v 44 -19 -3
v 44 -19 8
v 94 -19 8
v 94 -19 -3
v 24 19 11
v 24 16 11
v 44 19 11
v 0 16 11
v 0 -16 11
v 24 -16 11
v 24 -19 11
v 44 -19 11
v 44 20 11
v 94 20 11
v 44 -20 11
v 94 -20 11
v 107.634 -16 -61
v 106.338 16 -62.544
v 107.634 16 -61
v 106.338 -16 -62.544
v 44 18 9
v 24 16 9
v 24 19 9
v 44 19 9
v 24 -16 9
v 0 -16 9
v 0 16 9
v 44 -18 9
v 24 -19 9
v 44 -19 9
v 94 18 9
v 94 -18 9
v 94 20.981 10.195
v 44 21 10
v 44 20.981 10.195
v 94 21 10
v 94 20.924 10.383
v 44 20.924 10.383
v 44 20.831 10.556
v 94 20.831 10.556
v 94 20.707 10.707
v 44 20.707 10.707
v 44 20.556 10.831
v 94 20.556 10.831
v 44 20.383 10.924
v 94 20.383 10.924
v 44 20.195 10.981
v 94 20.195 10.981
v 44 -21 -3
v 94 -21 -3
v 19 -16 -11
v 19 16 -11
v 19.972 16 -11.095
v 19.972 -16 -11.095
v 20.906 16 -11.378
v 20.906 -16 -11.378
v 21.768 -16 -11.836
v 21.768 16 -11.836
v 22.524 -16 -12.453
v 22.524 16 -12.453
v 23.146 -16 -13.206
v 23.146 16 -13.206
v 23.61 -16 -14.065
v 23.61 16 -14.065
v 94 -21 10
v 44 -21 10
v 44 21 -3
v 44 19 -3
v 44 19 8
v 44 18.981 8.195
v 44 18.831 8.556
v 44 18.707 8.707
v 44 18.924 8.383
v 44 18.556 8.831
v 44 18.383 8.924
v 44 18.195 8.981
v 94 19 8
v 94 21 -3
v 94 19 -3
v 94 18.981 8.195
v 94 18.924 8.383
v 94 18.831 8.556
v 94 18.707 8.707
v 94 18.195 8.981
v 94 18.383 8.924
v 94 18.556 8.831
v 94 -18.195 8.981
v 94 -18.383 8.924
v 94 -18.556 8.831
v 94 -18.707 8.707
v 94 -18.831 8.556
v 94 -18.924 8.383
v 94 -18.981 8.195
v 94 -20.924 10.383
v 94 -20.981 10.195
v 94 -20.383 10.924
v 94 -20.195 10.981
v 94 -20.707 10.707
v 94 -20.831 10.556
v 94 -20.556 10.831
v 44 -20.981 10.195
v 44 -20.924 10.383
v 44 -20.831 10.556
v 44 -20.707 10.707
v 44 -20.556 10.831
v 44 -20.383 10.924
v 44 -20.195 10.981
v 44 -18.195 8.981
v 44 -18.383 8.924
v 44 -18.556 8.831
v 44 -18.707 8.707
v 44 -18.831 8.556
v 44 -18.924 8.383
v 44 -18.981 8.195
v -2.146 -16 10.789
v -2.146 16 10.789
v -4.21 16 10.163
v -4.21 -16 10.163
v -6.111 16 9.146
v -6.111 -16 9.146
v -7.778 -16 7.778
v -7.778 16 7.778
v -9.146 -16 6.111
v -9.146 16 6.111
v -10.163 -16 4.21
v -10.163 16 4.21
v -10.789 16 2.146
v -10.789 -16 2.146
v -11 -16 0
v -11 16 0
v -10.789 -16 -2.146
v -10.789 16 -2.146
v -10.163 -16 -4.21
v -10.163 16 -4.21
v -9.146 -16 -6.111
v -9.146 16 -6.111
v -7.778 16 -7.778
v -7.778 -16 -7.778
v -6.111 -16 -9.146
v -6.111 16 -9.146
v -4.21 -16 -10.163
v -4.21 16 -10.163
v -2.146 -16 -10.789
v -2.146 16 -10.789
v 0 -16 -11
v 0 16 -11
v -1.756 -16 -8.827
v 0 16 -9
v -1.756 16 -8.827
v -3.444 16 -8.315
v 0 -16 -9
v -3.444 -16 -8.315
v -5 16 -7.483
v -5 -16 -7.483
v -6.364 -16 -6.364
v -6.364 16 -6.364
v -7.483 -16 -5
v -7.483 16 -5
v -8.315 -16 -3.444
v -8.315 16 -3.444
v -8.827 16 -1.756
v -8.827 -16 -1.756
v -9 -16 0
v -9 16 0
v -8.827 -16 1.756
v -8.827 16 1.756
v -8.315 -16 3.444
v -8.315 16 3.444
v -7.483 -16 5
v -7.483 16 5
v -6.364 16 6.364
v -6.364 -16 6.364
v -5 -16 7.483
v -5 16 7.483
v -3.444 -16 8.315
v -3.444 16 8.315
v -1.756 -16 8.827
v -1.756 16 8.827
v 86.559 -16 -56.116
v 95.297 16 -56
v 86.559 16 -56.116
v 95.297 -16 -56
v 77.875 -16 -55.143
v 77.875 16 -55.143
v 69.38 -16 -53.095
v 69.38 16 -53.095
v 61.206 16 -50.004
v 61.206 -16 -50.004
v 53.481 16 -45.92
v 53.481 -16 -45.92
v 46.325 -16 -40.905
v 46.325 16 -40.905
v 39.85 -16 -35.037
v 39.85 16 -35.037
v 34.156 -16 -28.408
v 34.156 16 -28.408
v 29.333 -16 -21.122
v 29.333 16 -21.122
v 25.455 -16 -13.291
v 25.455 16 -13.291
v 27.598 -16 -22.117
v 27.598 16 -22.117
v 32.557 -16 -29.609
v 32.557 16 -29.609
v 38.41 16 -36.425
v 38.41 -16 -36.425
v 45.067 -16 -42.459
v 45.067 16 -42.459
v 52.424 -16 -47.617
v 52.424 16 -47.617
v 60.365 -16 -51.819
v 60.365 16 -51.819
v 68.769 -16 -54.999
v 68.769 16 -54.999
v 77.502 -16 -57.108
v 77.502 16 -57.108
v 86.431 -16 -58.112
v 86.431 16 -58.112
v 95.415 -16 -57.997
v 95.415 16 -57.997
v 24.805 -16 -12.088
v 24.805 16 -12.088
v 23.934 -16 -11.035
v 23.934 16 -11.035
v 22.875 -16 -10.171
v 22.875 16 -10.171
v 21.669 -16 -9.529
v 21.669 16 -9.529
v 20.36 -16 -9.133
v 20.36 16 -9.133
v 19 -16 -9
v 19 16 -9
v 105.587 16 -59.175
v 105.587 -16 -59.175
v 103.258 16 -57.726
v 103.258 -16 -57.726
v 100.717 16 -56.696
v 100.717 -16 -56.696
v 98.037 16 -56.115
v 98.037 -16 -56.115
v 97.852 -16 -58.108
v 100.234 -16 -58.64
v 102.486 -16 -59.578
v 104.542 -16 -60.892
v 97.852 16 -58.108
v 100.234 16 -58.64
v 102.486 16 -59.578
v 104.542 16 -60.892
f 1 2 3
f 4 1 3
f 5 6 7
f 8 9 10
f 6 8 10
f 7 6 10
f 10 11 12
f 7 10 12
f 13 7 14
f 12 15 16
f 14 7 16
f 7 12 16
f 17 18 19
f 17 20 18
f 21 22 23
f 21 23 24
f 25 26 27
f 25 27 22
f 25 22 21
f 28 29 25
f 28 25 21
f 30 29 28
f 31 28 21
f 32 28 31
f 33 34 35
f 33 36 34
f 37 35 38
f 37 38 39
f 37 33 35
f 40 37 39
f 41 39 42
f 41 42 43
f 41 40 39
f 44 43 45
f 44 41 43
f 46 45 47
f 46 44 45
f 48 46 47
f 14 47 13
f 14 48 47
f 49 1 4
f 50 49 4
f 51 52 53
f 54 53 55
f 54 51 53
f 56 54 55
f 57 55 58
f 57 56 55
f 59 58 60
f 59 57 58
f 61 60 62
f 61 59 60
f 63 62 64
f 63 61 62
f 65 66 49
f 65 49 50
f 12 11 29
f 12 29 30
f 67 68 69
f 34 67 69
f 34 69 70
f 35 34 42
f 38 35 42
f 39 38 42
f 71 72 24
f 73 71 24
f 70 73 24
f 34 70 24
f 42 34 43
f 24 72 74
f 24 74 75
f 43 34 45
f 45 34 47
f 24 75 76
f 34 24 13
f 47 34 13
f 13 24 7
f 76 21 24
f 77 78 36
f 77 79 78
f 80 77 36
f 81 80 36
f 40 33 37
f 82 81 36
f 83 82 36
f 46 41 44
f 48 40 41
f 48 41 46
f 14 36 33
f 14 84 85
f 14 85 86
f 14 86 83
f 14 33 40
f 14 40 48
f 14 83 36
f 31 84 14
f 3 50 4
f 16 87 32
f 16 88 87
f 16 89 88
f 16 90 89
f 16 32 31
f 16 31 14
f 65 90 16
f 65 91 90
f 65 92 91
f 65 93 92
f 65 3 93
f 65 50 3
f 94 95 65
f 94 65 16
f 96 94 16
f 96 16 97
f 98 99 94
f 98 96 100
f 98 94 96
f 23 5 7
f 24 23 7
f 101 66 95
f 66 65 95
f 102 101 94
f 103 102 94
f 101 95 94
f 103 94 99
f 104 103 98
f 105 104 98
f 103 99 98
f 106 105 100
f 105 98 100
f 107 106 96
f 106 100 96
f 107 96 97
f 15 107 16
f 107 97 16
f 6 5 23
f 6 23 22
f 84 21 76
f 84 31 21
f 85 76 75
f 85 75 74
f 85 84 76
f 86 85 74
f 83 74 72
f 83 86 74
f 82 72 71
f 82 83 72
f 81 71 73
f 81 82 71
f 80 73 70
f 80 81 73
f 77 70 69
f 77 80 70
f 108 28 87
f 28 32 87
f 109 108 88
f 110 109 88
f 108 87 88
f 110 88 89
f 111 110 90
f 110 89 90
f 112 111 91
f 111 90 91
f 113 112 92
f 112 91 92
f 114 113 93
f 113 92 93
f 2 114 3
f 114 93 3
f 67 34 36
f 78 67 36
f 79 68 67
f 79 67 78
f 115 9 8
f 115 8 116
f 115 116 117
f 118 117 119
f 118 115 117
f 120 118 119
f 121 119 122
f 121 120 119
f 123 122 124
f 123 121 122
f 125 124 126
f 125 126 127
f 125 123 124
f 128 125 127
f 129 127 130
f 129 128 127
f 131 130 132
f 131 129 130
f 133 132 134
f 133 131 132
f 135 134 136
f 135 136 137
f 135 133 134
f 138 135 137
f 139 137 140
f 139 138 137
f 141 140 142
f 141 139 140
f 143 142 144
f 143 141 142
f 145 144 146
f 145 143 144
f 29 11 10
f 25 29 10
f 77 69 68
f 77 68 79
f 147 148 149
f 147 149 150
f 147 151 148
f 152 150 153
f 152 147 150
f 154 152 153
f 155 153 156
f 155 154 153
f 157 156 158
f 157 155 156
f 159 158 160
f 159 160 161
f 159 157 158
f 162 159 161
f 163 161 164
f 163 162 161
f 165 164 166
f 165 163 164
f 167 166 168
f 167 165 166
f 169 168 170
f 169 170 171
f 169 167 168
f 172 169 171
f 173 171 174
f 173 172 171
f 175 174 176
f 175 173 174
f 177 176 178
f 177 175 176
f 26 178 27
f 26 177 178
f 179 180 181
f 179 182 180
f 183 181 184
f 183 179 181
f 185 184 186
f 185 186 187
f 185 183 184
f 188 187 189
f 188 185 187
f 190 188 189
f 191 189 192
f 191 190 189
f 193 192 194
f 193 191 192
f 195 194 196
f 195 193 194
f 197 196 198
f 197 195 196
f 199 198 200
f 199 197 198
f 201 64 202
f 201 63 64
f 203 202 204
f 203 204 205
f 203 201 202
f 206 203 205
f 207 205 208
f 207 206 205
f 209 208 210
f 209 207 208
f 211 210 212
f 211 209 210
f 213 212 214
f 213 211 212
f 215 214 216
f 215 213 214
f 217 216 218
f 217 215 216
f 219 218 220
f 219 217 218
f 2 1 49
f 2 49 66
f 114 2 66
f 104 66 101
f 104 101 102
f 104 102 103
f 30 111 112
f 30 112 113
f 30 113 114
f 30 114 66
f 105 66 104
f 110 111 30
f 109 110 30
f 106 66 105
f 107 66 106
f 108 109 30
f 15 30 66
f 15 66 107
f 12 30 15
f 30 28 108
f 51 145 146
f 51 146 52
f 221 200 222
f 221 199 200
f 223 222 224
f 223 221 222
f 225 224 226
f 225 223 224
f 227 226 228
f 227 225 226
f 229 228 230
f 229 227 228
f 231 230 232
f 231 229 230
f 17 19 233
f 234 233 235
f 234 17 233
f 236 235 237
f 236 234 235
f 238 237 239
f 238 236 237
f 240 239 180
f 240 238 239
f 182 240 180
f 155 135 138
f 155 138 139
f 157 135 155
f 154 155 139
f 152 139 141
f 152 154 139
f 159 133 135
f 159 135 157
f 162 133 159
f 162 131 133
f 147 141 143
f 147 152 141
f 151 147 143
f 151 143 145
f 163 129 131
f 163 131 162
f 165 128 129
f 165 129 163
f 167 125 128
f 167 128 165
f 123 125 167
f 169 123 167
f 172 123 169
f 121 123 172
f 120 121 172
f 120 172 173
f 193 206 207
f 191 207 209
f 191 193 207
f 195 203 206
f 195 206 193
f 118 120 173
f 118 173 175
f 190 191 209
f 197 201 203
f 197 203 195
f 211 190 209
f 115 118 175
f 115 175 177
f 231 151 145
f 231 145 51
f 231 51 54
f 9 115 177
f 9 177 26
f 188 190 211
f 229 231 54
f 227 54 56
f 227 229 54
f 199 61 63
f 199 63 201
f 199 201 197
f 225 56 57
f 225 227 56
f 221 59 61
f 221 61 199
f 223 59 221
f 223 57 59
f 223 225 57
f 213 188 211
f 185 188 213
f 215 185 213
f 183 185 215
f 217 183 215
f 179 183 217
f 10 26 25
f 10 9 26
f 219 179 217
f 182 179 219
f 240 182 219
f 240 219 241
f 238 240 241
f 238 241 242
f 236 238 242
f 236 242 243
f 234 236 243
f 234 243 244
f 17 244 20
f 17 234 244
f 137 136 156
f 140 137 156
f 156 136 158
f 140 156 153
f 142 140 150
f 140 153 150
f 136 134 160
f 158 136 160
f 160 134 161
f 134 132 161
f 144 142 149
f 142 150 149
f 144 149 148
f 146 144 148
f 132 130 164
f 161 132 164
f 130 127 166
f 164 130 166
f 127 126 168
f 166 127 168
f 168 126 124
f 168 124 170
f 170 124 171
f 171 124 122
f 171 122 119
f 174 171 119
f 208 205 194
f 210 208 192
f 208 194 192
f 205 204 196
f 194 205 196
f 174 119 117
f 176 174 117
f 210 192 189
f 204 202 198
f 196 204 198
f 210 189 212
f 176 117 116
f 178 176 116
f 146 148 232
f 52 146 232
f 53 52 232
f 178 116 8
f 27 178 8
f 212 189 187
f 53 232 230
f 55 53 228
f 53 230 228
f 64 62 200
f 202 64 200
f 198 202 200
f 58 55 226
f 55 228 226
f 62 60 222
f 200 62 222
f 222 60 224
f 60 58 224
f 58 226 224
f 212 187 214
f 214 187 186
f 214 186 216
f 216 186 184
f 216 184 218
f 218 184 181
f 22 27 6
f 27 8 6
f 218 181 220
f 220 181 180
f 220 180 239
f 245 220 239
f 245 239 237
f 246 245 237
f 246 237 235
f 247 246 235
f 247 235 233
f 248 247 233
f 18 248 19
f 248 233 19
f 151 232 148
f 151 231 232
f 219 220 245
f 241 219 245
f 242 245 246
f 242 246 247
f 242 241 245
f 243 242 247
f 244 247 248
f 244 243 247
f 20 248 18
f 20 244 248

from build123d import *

# Parameters (mm, degrees)
F1_DEPTH = 16
F2_W     = 70
F2_H     = 3
F3_DEPTH = 2
F4_W     = 50
F4_H     = 14
F5_DEPTH = 2
F6_R     = 1


with BuildPart() as f1:
    # F0 (on Front) → F1 (new body)
    with BuildSketch(Plane.XZ):
        with BuildLine():
            Line((94, 11), (0, 11))
            ThreePointArc((0, 11), (-11, 0), (0, -11))
            Line((0, -11), (19, -11))
            ThreePointArc((19, -11), (21.7681124643, -11.8361612201), (23.6103896104, -14.064978646))
            ThreePointArc((23.6103896104, -14.064978646), (52.4237101957, -47.6174640031), (95.4149528414, -57.9967593826))
            ThreePointArc((95.4149528414, -57.9967593826), (101.3804745105, -59.0597282402), (106.3380534538, -62.5439444501))
            Line((106.3380534538, -62.5439444501), (107.6335766724, -61))
            ThreePointArc((107.6335766724, -61), (102.0097459375, -57.1560789275), (95.2965735981, -56))
            ThreePointArc((95.2965735981, -56), (53.4811996085, -45.9198240056), (25.4545454545, -13.2909701044))
            ThreePointArc((25.4545454545, -13.2909701044), (22.87535745, -10.1706257081), (19, -9))
            Line((19, -9), (0, -9))
            ThreePointArc((0, -9), (-9, 0), (0, 9))
            Line((0, 9), (94, 9))
            Line((94, 9), (94, 11))
        make_face()
    extrude(amount=F1_DEPTH)

    # F2 (on face) → F3 (join)
    with BuildSketch(Plane.XY.offset(11)):
        with Locations((59, -17.5)):
            Rectangle(F2_W, F2_H)
    extrude(amount=-F3_DEPTH)

    # F4 (on face) → F5 (join)
    with BuildSketch(Plane.XZ.offset(19)):
        with Locations((69, 4)):
            Rectangle(F4_W, F4_H)
    extrude(amount=F5_DEPTH)

    # F6
    f6_edges = [f1.edges().sort_by_distance(p)[0] for p in [
        (69, -21, 11),
        (69, -19, 9),
    ]]
    fillet(f6_edges, radius=F6_R)

    # F7: F1 across plane


with BuildPart() as f1_1:
    add(f1.part)
    add(f1.part.mirror(Plane.XZ))


solid = f1_1.part
